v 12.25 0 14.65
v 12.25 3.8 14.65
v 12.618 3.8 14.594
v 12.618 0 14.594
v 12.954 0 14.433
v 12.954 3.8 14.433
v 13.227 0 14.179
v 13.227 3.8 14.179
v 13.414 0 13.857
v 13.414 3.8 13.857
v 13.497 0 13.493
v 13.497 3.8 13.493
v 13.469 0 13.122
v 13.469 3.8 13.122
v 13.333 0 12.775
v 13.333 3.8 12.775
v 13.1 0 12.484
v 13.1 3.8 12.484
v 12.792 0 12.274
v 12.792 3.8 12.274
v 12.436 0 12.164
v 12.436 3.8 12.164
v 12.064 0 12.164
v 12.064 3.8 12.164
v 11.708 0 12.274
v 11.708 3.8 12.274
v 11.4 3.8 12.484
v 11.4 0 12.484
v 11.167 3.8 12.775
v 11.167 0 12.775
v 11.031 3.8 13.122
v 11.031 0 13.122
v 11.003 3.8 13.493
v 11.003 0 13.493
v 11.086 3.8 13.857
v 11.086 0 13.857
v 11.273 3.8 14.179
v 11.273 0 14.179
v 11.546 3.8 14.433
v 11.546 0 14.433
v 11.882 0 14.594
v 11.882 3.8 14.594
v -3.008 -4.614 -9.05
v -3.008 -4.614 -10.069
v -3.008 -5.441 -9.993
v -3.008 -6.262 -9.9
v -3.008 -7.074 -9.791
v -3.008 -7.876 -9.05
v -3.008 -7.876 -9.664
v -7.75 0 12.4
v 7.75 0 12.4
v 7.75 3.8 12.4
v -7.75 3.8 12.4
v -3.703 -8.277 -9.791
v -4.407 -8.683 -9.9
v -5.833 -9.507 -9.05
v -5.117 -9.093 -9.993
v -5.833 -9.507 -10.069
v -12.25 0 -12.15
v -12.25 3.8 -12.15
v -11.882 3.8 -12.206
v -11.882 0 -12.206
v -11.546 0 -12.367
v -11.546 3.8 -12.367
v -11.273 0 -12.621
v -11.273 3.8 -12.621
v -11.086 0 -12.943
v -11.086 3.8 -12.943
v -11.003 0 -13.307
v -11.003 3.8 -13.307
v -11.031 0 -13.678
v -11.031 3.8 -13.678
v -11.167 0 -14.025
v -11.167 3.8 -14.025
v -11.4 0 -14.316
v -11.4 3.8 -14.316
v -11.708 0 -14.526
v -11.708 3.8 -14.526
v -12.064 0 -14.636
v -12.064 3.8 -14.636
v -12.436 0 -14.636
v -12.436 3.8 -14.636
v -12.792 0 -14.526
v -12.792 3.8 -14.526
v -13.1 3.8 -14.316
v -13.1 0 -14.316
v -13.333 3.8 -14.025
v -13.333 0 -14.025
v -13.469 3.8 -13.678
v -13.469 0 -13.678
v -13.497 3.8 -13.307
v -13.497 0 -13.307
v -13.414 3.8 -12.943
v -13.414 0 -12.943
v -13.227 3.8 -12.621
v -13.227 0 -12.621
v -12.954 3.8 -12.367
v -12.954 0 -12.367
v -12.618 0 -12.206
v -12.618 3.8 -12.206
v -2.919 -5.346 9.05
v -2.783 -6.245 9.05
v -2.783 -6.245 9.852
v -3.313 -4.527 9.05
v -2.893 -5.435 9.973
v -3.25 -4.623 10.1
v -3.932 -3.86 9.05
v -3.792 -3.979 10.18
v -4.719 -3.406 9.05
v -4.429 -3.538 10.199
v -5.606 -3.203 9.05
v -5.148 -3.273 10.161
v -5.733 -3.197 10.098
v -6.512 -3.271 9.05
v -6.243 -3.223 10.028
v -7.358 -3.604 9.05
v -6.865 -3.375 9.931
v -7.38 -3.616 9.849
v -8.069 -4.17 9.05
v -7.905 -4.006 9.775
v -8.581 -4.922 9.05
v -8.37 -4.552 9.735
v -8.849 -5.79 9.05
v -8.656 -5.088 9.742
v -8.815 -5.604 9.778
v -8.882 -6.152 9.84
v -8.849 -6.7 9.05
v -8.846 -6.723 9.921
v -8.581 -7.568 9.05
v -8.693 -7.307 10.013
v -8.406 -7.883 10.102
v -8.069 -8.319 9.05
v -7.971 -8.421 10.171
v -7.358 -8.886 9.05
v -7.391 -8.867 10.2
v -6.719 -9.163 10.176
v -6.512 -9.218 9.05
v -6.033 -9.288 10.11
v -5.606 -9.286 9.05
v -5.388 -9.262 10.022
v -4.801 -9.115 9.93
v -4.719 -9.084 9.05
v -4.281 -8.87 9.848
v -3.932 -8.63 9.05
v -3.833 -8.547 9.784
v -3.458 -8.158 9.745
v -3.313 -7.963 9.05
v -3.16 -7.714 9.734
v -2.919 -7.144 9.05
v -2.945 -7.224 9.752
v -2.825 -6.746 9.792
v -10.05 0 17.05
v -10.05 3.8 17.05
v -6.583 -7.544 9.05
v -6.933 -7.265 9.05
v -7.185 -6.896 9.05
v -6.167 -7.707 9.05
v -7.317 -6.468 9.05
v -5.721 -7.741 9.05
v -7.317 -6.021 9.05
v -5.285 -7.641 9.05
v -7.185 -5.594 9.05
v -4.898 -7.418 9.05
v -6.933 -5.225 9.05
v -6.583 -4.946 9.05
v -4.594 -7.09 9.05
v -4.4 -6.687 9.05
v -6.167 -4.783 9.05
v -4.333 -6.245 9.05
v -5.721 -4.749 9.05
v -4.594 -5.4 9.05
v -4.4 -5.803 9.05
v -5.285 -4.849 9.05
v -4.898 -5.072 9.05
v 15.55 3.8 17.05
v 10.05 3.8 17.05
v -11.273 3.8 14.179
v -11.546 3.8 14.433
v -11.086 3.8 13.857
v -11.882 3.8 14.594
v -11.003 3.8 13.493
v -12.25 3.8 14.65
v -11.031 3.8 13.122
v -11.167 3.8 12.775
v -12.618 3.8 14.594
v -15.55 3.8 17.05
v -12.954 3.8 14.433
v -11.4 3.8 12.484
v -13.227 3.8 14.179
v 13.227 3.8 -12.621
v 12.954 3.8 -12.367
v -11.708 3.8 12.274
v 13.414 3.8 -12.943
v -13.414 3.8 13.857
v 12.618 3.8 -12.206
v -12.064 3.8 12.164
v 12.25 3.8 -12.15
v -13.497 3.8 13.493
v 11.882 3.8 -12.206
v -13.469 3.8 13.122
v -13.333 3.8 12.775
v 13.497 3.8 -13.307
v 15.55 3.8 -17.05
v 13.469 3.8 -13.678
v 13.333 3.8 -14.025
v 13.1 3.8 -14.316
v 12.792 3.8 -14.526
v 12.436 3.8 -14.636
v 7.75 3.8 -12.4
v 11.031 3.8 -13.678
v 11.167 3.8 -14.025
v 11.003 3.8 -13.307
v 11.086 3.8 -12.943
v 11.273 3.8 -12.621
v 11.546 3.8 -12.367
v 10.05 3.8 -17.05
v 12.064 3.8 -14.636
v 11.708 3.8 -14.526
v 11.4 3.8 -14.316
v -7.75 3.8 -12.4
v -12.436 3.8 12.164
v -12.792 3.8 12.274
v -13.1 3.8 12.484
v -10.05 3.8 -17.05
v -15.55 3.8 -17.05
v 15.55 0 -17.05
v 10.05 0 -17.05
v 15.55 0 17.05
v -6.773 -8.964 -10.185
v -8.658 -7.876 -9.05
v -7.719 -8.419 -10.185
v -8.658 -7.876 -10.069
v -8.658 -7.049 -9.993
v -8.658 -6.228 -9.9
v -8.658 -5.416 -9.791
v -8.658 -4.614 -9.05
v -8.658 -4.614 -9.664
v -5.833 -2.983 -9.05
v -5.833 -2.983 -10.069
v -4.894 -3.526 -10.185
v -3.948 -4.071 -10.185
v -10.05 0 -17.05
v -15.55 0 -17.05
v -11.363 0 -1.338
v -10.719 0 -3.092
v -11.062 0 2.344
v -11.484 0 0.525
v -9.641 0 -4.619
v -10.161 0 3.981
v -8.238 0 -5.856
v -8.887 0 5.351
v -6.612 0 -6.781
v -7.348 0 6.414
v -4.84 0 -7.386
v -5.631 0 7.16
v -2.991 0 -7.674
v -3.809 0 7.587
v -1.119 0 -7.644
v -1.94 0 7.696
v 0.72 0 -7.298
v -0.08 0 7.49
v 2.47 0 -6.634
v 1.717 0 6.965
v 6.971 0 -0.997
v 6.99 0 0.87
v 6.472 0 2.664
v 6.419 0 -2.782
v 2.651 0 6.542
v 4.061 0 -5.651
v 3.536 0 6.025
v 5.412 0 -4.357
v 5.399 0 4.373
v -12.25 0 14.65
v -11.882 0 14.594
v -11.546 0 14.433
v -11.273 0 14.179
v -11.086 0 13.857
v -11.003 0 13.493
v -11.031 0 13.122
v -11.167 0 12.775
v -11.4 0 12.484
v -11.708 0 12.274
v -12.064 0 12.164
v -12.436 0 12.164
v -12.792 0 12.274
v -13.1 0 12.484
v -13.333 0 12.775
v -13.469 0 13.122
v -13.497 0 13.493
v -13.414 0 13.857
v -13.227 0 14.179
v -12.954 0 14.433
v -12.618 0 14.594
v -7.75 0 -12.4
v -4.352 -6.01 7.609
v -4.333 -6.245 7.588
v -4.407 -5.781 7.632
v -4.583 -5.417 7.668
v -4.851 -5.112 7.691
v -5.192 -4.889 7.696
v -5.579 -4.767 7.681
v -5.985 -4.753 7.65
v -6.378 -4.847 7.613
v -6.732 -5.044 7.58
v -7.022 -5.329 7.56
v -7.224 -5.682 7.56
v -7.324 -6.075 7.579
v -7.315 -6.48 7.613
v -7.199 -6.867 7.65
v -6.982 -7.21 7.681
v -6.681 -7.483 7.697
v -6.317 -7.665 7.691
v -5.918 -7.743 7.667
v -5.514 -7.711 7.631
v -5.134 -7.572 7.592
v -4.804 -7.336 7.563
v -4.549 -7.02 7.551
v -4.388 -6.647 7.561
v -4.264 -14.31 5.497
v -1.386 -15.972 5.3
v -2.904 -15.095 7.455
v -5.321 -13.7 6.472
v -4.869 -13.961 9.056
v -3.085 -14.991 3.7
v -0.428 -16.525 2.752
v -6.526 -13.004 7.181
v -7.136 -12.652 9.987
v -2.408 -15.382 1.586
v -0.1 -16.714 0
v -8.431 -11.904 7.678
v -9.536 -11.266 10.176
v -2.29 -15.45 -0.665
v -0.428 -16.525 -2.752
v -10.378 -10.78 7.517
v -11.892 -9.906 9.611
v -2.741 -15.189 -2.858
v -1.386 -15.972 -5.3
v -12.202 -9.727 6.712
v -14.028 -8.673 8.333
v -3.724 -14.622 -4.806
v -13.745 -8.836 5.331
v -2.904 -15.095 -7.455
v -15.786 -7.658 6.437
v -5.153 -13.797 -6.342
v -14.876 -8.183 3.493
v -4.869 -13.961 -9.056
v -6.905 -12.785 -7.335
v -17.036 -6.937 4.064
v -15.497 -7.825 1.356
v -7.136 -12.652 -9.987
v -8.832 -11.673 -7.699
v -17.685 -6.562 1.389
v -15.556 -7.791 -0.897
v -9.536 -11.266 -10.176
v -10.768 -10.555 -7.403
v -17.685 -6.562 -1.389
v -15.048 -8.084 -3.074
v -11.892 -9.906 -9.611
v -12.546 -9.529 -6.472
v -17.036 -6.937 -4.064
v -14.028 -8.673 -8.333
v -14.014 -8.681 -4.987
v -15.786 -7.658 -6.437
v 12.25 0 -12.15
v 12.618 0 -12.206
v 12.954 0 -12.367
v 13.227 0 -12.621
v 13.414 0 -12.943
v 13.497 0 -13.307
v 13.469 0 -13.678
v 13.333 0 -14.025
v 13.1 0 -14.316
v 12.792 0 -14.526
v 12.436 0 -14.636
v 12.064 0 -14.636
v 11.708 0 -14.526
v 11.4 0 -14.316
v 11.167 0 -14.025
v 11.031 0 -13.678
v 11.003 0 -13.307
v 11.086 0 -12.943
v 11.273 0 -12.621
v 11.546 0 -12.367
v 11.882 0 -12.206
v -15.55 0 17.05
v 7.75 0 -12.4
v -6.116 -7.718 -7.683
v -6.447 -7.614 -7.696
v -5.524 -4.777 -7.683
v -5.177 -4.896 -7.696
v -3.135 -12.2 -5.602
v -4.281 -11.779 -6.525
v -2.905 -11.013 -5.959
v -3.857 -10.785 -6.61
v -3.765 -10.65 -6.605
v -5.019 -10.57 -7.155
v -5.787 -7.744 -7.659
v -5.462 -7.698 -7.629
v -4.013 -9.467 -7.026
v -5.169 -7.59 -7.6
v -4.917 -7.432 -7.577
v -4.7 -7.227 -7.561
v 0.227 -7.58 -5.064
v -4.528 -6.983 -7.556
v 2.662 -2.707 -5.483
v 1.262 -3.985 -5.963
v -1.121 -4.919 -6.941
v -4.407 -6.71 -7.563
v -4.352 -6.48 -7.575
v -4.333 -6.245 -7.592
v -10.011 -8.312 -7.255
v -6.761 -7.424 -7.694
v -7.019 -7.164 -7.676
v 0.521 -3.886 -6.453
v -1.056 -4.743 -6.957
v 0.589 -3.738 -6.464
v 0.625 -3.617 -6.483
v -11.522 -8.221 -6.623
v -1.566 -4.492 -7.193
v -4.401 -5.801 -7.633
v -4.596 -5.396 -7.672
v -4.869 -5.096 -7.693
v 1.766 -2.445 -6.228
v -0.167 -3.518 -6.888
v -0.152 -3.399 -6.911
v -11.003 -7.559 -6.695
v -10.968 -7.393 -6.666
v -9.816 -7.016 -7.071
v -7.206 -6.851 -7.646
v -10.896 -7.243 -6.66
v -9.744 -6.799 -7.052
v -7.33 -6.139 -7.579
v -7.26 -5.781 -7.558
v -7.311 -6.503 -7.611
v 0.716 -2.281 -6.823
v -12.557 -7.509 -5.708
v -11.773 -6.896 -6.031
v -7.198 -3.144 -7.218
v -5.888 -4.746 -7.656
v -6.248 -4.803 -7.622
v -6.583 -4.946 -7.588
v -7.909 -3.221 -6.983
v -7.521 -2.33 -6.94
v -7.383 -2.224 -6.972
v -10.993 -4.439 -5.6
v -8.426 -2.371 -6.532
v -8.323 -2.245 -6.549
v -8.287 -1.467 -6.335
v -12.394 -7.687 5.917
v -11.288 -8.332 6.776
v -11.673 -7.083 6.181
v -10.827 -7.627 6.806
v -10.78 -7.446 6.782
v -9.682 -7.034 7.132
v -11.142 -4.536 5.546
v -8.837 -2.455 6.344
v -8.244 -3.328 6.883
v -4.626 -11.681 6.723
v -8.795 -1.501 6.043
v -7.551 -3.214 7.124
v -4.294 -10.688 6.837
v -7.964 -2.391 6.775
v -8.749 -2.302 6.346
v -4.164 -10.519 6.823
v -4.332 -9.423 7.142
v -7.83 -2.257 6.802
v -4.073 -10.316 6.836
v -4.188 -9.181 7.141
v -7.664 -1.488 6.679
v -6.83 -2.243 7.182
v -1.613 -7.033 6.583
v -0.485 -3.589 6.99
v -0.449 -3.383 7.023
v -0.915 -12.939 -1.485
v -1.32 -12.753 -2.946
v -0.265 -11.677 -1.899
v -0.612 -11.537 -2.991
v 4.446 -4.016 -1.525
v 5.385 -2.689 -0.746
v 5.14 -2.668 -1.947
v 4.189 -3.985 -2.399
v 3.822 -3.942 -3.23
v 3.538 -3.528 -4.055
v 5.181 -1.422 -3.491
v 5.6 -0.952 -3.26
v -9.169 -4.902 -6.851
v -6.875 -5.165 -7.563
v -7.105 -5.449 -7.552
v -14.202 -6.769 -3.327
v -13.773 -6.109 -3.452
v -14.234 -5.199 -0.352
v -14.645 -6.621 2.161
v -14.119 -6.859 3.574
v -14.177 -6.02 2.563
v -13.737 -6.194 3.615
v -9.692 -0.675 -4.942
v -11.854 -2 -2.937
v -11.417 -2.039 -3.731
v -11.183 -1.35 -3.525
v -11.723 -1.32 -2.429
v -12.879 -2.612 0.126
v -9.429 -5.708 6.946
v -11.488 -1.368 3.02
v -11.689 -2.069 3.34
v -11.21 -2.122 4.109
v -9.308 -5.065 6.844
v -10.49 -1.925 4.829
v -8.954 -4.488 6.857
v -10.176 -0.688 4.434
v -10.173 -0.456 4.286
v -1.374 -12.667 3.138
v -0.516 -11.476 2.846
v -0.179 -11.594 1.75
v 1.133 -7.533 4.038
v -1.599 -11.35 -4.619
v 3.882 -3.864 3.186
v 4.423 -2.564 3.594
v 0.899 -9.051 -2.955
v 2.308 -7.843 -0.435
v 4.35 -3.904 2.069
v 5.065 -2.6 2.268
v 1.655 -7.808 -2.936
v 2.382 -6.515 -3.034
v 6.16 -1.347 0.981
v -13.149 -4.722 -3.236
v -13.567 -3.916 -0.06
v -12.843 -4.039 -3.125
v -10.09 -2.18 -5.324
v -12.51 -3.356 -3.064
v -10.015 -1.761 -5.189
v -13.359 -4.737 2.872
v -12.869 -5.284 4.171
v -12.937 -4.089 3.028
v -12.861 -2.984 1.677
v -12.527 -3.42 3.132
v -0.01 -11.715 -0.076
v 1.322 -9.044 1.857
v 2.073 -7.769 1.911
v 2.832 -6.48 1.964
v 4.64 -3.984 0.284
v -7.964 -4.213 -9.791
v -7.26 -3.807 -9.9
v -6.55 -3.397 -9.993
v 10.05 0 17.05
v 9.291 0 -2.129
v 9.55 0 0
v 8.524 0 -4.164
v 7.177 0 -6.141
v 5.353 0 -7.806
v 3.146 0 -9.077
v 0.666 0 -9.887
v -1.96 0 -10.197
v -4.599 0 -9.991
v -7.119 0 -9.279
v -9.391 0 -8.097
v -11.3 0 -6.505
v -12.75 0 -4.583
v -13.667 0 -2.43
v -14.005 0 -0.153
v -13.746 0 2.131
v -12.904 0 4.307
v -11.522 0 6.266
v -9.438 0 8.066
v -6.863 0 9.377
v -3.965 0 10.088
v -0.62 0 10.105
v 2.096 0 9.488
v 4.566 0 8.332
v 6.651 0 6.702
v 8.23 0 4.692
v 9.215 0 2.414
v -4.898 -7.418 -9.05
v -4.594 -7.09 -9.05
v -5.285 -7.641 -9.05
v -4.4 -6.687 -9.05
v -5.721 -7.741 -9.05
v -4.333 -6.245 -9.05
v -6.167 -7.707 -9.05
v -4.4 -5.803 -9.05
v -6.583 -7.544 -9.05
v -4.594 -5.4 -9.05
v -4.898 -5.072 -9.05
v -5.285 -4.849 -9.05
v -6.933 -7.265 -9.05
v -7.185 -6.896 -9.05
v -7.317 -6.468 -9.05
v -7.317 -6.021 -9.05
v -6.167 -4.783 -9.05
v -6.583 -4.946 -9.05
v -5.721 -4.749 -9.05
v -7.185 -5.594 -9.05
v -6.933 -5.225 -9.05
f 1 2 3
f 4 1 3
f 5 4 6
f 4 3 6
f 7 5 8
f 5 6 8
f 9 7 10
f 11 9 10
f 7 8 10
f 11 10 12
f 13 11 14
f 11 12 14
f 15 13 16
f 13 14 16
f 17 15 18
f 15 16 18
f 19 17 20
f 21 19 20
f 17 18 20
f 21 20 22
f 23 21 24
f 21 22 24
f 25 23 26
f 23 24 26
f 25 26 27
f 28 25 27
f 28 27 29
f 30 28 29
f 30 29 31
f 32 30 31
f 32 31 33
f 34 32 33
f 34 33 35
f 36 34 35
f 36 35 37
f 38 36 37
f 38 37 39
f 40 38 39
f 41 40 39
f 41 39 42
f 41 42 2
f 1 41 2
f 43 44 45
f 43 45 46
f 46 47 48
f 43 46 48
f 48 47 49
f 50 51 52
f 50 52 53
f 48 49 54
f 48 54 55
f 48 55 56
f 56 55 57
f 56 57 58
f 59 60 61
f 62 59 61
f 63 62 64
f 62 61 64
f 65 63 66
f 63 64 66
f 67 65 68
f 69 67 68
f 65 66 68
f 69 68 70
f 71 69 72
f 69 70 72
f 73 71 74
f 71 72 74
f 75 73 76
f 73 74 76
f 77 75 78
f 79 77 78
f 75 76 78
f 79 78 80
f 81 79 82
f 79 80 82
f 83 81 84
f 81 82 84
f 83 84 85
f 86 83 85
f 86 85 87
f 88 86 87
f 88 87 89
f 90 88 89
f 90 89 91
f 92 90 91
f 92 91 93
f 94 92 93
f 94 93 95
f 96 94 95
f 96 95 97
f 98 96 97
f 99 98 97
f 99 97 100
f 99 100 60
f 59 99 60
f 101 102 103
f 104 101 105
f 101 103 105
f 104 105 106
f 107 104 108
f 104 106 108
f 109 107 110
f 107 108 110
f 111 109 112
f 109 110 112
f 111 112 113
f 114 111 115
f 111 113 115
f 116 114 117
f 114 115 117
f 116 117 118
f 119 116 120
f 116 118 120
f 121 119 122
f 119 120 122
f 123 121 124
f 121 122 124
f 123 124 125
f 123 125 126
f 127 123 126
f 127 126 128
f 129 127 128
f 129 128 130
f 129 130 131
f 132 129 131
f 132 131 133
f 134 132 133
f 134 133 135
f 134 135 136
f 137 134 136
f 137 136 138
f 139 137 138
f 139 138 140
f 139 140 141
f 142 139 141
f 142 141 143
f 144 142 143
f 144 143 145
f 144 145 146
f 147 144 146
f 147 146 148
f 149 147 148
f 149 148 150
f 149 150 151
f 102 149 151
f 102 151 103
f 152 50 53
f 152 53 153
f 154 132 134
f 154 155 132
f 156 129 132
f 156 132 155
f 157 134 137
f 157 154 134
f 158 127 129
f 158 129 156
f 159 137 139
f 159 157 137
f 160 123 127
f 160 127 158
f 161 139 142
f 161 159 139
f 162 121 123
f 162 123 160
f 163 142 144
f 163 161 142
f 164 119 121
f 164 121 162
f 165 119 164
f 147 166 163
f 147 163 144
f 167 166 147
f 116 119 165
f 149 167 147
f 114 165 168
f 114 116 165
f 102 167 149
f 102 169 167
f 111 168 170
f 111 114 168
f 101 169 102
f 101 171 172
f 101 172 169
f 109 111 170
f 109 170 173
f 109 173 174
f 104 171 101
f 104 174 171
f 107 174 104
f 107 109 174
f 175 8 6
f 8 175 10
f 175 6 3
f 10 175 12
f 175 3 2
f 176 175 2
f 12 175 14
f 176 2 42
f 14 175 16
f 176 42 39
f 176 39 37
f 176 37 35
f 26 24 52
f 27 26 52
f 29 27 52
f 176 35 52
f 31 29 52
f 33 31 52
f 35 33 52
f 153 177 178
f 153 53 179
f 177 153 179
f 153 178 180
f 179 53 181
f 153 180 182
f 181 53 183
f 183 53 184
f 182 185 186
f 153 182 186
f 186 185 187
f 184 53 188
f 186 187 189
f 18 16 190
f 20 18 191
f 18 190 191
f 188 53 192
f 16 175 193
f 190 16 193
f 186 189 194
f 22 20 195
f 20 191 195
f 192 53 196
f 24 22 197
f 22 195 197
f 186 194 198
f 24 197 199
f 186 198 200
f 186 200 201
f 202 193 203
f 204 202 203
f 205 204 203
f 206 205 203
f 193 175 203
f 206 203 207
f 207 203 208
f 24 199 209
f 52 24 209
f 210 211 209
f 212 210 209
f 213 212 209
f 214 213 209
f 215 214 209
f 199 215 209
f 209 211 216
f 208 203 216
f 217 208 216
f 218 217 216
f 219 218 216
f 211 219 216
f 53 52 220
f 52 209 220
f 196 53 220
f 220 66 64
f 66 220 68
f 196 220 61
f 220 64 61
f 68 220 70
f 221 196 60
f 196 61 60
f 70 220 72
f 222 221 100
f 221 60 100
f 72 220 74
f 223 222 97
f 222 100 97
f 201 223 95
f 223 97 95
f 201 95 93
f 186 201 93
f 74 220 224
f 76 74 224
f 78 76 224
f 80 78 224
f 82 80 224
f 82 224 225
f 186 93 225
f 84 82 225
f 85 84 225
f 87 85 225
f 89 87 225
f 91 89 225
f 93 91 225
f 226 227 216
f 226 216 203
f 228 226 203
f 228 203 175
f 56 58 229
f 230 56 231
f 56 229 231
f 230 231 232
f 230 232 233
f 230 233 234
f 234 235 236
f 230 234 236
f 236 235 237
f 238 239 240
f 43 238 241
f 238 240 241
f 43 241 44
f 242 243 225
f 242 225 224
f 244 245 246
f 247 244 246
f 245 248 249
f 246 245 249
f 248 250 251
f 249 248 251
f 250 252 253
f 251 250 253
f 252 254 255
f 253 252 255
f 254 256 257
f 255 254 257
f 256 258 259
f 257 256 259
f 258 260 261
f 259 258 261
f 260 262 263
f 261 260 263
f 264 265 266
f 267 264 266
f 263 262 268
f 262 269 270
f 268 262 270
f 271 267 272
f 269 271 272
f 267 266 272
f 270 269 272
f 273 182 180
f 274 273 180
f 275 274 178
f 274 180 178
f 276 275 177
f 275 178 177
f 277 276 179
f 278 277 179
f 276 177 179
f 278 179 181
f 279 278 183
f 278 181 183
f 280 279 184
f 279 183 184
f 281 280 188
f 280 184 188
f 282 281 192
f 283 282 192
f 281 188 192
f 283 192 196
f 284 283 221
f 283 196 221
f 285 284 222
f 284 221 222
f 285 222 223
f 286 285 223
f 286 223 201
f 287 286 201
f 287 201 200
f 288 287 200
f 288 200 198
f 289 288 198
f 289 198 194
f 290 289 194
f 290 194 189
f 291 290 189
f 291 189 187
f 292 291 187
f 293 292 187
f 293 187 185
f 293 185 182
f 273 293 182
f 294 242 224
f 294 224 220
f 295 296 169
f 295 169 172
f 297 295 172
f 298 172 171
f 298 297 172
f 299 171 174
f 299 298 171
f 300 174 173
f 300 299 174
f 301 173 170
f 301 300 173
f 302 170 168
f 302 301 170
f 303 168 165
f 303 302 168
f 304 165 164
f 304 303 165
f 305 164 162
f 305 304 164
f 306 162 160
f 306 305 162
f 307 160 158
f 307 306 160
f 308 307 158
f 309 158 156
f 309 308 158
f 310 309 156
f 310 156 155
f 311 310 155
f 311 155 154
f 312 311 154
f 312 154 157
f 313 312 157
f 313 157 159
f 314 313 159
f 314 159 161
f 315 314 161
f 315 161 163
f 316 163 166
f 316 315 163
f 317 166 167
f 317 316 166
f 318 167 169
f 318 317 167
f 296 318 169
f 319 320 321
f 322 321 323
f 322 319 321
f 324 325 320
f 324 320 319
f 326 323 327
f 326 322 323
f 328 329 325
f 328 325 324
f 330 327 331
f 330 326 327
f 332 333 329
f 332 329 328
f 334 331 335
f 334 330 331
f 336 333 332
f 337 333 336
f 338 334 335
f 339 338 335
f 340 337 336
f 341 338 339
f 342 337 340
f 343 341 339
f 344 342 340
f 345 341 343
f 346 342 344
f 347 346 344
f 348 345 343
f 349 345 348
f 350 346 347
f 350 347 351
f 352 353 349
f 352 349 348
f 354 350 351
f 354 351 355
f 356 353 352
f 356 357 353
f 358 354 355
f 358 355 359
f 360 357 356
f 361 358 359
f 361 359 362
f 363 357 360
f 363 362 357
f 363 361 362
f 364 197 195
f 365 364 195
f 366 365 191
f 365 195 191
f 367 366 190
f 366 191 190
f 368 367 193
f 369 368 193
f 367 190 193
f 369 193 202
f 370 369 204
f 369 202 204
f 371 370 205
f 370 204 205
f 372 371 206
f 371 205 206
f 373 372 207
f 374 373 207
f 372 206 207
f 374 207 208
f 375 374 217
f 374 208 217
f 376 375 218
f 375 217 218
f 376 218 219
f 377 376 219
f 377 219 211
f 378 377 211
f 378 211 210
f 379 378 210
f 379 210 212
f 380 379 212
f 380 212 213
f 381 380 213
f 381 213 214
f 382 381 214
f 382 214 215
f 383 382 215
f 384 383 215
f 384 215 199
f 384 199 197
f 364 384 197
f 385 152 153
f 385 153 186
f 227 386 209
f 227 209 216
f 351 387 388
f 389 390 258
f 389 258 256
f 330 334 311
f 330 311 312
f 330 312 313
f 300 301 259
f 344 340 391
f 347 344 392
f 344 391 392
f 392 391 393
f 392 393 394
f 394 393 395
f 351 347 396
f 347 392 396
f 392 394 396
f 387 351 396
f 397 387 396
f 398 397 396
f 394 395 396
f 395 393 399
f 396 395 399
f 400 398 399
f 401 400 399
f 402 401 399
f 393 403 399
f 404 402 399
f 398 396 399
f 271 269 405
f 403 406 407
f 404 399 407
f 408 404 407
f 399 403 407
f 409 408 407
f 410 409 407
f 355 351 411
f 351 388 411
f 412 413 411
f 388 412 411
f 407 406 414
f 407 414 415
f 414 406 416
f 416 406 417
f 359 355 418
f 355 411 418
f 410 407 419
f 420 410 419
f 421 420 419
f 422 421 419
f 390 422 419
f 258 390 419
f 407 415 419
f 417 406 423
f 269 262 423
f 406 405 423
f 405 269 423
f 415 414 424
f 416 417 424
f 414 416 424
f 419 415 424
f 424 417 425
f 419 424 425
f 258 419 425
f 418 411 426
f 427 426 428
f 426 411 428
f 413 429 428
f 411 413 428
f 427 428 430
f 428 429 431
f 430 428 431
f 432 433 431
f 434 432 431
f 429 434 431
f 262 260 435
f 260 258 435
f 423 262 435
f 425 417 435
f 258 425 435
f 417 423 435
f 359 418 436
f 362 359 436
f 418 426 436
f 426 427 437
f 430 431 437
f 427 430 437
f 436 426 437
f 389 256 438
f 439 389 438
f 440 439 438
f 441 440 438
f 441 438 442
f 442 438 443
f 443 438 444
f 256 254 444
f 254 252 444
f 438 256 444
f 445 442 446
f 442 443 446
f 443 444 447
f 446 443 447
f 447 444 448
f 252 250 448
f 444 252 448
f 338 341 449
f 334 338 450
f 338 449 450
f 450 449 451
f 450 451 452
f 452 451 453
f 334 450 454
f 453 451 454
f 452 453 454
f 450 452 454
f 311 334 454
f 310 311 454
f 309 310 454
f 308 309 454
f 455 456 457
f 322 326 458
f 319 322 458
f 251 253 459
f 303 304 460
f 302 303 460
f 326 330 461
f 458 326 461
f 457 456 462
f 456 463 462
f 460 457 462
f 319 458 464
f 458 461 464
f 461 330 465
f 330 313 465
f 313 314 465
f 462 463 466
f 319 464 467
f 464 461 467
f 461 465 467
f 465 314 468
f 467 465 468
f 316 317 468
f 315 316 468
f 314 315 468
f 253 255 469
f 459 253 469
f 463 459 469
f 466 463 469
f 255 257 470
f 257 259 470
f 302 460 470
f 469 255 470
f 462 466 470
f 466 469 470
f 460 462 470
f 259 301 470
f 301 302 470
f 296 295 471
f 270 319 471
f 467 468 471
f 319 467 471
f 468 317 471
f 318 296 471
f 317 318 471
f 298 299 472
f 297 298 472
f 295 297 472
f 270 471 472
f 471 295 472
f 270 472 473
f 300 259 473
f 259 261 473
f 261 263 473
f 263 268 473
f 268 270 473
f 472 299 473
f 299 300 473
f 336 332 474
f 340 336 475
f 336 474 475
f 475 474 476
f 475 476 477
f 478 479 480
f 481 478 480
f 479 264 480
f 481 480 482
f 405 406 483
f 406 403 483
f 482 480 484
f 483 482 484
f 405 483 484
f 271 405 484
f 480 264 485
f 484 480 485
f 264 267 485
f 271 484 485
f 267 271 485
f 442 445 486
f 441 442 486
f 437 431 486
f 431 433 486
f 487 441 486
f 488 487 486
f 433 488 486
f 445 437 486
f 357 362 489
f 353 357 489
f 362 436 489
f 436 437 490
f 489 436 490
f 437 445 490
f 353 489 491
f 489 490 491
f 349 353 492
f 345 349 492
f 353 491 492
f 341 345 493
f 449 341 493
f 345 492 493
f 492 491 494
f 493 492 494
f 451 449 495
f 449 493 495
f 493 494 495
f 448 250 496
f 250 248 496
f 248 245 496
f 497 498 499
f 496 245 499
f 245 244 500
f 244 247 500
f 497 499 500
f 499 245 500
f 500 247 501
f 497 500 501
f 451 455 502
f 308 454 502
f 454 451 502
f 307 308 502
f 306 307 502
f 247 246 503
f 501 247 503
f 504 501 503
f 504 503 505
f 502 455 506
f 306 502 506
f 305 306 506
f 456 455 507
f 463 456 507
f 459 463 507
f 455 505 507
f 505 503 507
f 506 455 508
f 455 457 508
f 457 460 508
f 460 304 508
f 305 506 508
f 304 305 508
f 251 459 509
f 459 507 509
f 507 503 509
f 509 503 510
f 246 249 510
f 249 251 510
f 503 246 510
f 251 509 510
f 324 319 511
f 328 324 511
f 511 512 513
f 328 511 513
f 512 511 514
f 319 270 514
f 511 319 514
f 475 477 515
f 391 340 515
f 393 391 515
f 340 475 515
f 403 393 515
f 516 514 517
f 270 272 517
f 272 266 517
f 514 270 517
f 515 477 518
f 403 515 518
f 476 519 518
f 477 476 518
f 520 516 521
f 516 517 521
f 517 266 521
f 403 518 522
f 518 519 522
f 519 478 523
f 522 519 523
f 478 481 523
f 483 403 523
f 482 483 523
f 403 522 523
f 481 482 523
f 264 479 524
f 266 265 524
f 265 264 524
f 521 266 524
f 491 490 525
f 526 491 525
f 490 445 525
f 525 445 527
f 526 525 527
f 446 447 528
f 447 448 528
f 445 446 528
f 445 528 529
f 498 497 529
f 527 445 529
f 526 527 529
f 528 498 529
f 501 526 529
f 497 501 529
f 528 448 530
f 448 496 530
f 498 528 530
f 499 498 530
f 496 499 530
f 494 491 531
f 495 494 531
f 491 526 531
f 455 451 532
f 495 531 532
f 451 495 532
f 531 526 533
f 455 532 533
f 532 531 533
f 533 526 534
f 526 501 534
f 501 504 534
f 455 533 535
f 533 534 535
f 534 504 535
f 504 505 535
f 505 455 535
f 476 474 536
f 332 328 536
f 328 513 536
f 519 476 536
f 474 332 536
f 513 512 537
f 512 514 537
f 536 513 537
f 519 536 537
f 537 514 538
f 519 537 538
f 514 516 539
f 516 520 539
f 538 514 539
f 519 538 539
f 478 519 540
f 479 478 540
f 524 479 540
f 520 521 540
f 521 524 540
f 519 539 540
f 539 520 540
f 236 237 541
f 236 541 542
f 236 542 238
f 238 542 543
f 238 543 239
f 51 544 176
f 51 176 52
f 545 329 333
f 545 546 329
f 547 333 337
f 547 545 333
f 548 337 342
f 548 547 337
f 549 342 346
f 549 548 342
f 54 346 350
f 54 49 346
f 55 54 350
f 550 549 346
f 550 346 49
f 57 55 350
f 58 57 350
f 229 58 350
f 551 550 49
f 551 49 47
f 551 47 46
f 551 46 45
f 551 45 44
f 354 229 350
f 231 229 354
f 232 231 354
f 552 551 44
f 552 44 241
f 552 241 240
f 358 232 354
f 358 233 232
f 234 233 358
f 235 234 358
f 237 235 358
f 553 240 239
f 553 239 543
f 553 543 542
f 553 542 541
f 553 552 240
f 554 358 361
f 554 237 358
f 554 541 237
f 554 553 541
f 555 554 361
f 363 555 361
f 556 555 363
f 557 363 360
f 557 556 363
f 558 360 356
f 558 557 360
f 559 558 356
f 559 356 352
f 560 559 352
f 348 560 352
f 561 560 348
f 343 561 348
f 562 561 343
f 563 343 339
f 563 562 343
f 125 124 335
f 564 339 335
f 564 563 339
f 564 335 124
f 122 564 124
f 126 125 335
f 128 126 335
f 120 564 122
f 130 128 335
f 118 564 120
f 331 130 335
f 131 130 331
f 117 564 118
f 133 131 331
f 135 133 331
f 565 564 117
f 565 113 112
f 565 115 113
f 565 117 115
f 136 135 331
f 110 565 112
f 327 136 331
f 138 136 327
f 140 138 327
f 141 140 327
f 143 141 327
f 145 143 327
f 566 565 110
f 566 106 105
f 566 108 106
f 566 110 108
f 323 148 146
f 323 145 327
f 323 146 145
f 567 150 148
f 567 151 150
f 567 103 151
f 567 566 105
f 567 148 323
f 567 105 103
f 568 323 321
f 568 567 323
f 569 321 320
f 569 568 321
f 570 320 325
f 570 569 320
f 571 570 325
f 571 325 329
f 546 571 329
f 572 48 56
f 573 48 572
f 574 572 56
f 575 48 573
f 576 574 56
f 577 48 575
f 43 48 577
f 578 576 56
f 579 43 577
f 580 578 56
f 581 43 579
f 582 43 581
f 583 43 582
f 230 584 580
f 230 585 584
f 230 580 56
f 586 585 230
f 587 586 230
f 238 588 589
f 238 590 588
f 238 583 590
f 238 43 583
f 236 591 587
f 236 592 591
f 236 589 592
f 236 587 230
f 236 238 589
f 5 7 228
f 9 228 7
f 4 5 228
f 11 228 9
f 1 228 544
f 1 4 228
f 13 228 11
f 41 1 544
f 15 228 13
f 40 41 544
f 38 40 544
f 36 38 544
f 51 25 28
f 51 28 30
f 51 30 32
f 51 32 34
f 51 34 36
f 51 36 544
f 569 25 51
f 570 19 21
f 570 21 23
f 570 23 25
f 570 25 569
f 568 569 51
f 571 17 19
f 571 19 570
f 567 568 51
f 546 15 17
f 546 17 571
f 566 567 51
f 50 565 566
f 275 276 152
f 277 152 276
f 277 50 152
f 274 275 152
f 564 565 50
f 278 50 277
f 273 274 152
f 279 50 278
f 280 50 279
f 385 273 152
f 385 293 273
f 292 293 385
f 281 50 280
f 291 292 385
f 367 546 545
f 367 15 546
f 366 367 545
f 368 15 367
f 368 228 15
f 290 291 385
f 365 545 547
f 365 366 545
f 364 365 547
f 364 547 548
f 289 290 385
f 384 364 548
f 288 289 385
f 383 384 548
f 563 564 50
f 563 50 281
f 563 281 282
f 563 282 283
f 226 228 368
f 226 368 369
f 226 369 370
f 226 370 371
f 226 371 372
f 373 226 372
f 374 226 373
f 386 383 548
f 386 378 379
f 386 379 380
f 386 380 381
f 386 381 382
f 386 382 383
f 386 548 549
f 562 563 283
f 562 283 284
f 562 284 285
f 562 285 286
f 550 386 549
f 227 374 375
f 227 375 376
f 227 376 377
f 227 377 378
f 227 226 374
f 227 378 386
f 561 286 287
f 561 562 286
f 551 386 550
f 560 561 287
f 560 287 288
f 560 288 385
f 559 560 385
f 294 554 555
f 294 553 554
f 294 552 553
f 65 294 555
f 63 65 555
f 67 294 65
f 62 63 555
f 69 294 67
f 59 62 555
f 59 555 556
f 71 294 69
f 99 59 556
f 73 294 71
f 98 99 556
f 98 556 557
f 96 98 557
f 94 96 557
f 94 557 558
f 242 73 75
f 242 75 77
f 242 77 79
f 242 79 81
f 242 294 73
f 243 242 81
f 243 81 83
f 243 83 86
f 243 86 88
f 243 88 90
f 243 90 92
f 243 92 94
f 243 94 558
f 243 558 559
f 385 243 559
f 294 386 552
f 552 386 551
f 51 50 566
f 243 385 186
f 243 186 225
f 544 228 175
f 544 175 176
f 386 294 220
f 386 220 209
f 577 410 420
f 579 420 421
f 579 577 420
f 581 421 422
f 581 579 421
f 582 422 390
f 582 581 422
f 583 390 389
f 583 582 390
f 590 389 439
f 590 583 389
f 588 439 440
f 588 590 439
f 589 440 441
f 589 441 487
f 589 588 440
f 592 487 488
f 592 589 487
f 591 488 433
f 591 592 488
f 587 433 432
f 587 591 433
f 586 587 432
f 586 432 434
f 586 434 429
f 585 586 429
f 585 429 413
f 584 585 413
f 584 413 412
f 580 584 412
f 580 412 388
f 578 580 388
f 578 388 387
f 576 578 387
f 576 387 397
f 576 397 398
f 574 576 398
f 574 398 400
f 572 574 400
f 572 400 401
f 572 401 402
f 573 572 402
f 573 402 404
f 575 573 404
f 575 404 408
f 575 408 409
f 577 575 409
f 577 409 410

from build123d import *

# Parameters (mm, degrees)
BOSS_EXTRUDE1_DEPTH     = 3.8
CUT_EXTRUDE1_DEPTH      = 33.04999228
CUT_EXTRUDE2_DEPTH      = 30.761273573
CUT_EXTRUDE2_DEPTH_BACK = 30.761273573
SKETCH7_R               = 1.5
CUT_EXTRUDE3_DEPTH      = 8
SKETCH9_R               = 3.05
CUT_EXTRUDE4_DEPTH      = 8
SKETCH10_R              = 1.25
CUT_EXTRUDE5_DEPTH      = 33.0499924


with BuildPart() as part:
    # Sketch1 → Boss-Extrude1 (new body)
    with BuildSketch(Plane(origin=(0, 0, 0), x_dir=(1, 0, 0), z_dir=(0, 1, 0))):
        Polygon((-15.55, -17.05), (-15.55, 17.05), (-10.05, 17.05), (-7.75, 12.4), (7.75, 12.4), (10.05, 17.05), (15.55, 17.05), (15.55, -17.05), (10.05, -17.05), (7.75, -12.4), (-7.75, -12.4), (-10.05, -17.05), align=None)
    extrude(amount=BOSS_EXTRUDE1_DEPTH)

    # Revolve1: read off the stored shape, not the designer's step
    # Revolve1 outline → Revolve1 (revolve)
    with BuildSketch(Plane(origin=(-1.670959119, 0.964728697, 0), x_dir=(0.8660254037844398, -0.499999999999998, 0), z_dir=(0, 0, 1))):
        Polygon((10.200000298, -14.525), (10.200000248, 4.775000143), (3.79917118, 1.079479758), (0, 1.079479758), (0, -14.525), align=None)
    revolve(axis=Axis((-1.670959119, 0.964728697, 0), (0.499999999999998, 0.8660254037844398, 0)))

    # Sketch3 → Cut-Extrude1 (cut, through all)
    with BuildSketch(Plane(origin=(0, 3.8, 0), x_dir=(1, 0, 0), z_dir=(0, 1, 0))):
        Polygon((-10.05, 17.05), (-15.55, 17.05), (-15.55, -17.05), (-10.05, -17.05), (-7.75, -12.4), (7.75, -12.4), (10.05, -17.05), (15.55, -17.05), (15.55, 17.05), (10.05, 17.05), (7.75, 12.4), (-7.75, 12.4), align=None)
    extrude(amount=CUT_EXTRUDE1_DEPTH, mode=Mode.SUBTRACT)

    # Boundary-Cut1: read off the stored shape, not the designer's step
    # Boundary-Cut1: loft between two sections, ruled curve by curve
    boundary_cut1_from = [
        Edge.make_bspline([(-4.264195988, -14.310090618, 5.497330482), (-3.952600534, -14.489990338, 5.144451044), (-3.390059189, -14.814773735, 4.367149183), (-2.757568421, -15.17994245, 3.035429027), (-2.364627971, -15.406806725, 1.585508103), (-2.221728438, -15.489309808, 0.075173566), (-2.339233368, -15.421468305, -1.437931316), (-2.707711497, -15.208727358, -2.896270105), (-3.317731561, -14.85653211, -4.242306363), (-4.416065853, -14.222408511, -5.821756357), (-6.253782159, -13.161402507, -7.269581365), (-8.866989476, -11.652666559, -7.900430754), (-11.490387225, -10.138047163, -7.328308667), (-13.35210057, -9.063186462, -5.921916444), (-14.476778582, -8.413853309, -4.367433824), (-15.10932004, -8.048655327, -3.03533591), (-15.50227373, -7.821783409, -1.585450518), (-15.645207871, -7.739260344, -0.075222081), (-15.527690686, -7.807108923, 1.437904969), (-15.159193701, -8.019860756, 2.896296072), (-14.549188448, -8.372047453, 4.242316671), (-13.450871673, -9.006160938, 5.821729516), (-11.613084746, -10.067207715, 7.269617015), (-9.000025494, -11.575858178, 7.900380651), (-6.376366965, -13.090628136, 7.328435161), (-4.887386896, -13.95029118, 6.203089356), (-4.264195988, -14.310090618, 5.497330482)], [0, 0, 0, 0, 0.03125, 0.0625, 0.09375, 0.125, 0.15625, 0.1875, 0.21875, 0.25, 0.3125, 0.375, 0.4375, 0.5, 0.53125, 0.5625, 0.59375, 0.625, 0.65625, 0.6875, 0.71875, 0.75, 0.8125, 0.875, 0.9375, 1, 1, 1, 1], 3),
    ]
    boundary_cut1_to = [
        Edge.make_bspline([(3.535869827, 0, 6.0249567), (4.000260434, 0, 5.71827451), (4.874892388, 0, 5.020718912), (5.953015986, 0, 3.734542034), (6.720260155, 0, 2.238505144), (7.096013388, 0, 0.597243156), (7.030810986, 0, -1.085759731), (6.533226027, 0, -2.693977998), (5.66704479, 0, -4.133167867), (4.126269006, 0, -5.75895362), (1.680235047, 0, -7.172531093), (-1.628432874, 0, -7.851036071), (-4.989185483, 0, -7.528189152), (-7.581050356, 0, -6.415888298), (-9.330615811, 0, -5.020904789), (-10.408619135, 0, -3.734578971), (-11.176149314, 0, -2.238388975), (-11.55202821, 0, -0.597306131), (-11.48668895, 0, 1.0858282), (-10.988969574, 0, 2.693884042), (-10.123088416, 0, 4.133306502), (-8.582018083, 0, 5.758852747), (-6.136208886, 0, 7.172596545), (-2.827313809, 0, 7.85100057), (0.53292915, 0, 7.528284962), (2.607088614, 0, 6.63832108), (3.535869827, 0, 6.0249567)], [0, 0, 0, 0, 0.03125, 0.0625, 0.09375, 0.125, 0.15625, 0.1875, 0.21875, 0.25, 0.3125, 0.375, 0.4375, 0.5, 0.53125, 0.5625, 0.59375, 0.625, 0.65625, 0.6875, 0.71875, 0.75, 0.8125, 0.875, 0.9375, 1, 1, 1, 1], 3),
    ]
    boundary_cut1 = Solid(Shell([*[Face.make_surface_from_curves(boundary_cut1_from[k], boundary_cut1_to[k]) for k in range(1)], Face(Wire(boundary_cut1_from)), Face(Wire(boundary_cut1_to))]))
    add(boundary_cut1, mode=Mode.SUBTRACT)

    # Sketch7 → Cut-Extrude2 (cut, two sides: drawn at the far end of the back side and taken through both)
    with BuildSketch(Plane.XY.offset(-CUT_EXTRUDE2_DEPTH_BACK)):
        with Locations((-5.833459119, -6.24493279)):
            Circle(SKETCH7_R)
    extrude(amount=CUT_EXTRUDE2_DEPTH + CUT_EXTRUDE2_DEPTH_BACK, mode=Mode.SUBTRACT)

    # Sketch8 → Cut-Extrude3 (cut)
    with BuildSketch(Plane(origin=(0, 0, -17.05), x_dir=(-1, 0, 0), z_dir=(0, 0, -1))):
        Polygon((8.658459119, -4.613918279), (5.833459119, -2.982903769), (3.008459119, -4.613918279), (3.008459119, -7.8759473), (5.833459119, -9.50696181), (8.658459119, -7.8759473), align=None)
    extrude(amount=-CUT_EXTRUDE3_DEPTH, mode=Mode.SUBTRACT)

    # Sketch9 → Cut-Extrude4 (cut)
    with BuildSketch(Plane.XY.offset(17.05)):
        with Locations((-5.833459119, -6.24493279)):
            Circle(SKETCH9_R)
    extrude(amount=-CUT_EXTRUDE4_DEPTH, mode=Mode.SUBTRACT)

    # Sketch10 → Cut-Extrude5 (cut, through all)
    with BuildSketch(Plane(origin=(0, 3.8, 0), x_dir=(1, 0, 0), z_dir=(0, 1, 0))):
        with Locations(Location((-12.25, 13.4, 0), (0, 0, 270))):
            Circle(SKETCH10_R)
        with Locations(Location((-12.25, -13.4, 0), (0, 0, 270))):
            Circle(SKETCH10_R)
        with Locations(Location((12.25, -13.4, 0), (0, 0, 270))):
            Circle(SKETCH10_R)
        with Locations(Location((12.25, 13.4, 0), (0, 0, 270))):
            Circle(SKETCH10_R)
    extrude(amount=-CUT_EXTRUDE5_DEPTH, mode=Mode.SUBTRACT)


solid = part.part
